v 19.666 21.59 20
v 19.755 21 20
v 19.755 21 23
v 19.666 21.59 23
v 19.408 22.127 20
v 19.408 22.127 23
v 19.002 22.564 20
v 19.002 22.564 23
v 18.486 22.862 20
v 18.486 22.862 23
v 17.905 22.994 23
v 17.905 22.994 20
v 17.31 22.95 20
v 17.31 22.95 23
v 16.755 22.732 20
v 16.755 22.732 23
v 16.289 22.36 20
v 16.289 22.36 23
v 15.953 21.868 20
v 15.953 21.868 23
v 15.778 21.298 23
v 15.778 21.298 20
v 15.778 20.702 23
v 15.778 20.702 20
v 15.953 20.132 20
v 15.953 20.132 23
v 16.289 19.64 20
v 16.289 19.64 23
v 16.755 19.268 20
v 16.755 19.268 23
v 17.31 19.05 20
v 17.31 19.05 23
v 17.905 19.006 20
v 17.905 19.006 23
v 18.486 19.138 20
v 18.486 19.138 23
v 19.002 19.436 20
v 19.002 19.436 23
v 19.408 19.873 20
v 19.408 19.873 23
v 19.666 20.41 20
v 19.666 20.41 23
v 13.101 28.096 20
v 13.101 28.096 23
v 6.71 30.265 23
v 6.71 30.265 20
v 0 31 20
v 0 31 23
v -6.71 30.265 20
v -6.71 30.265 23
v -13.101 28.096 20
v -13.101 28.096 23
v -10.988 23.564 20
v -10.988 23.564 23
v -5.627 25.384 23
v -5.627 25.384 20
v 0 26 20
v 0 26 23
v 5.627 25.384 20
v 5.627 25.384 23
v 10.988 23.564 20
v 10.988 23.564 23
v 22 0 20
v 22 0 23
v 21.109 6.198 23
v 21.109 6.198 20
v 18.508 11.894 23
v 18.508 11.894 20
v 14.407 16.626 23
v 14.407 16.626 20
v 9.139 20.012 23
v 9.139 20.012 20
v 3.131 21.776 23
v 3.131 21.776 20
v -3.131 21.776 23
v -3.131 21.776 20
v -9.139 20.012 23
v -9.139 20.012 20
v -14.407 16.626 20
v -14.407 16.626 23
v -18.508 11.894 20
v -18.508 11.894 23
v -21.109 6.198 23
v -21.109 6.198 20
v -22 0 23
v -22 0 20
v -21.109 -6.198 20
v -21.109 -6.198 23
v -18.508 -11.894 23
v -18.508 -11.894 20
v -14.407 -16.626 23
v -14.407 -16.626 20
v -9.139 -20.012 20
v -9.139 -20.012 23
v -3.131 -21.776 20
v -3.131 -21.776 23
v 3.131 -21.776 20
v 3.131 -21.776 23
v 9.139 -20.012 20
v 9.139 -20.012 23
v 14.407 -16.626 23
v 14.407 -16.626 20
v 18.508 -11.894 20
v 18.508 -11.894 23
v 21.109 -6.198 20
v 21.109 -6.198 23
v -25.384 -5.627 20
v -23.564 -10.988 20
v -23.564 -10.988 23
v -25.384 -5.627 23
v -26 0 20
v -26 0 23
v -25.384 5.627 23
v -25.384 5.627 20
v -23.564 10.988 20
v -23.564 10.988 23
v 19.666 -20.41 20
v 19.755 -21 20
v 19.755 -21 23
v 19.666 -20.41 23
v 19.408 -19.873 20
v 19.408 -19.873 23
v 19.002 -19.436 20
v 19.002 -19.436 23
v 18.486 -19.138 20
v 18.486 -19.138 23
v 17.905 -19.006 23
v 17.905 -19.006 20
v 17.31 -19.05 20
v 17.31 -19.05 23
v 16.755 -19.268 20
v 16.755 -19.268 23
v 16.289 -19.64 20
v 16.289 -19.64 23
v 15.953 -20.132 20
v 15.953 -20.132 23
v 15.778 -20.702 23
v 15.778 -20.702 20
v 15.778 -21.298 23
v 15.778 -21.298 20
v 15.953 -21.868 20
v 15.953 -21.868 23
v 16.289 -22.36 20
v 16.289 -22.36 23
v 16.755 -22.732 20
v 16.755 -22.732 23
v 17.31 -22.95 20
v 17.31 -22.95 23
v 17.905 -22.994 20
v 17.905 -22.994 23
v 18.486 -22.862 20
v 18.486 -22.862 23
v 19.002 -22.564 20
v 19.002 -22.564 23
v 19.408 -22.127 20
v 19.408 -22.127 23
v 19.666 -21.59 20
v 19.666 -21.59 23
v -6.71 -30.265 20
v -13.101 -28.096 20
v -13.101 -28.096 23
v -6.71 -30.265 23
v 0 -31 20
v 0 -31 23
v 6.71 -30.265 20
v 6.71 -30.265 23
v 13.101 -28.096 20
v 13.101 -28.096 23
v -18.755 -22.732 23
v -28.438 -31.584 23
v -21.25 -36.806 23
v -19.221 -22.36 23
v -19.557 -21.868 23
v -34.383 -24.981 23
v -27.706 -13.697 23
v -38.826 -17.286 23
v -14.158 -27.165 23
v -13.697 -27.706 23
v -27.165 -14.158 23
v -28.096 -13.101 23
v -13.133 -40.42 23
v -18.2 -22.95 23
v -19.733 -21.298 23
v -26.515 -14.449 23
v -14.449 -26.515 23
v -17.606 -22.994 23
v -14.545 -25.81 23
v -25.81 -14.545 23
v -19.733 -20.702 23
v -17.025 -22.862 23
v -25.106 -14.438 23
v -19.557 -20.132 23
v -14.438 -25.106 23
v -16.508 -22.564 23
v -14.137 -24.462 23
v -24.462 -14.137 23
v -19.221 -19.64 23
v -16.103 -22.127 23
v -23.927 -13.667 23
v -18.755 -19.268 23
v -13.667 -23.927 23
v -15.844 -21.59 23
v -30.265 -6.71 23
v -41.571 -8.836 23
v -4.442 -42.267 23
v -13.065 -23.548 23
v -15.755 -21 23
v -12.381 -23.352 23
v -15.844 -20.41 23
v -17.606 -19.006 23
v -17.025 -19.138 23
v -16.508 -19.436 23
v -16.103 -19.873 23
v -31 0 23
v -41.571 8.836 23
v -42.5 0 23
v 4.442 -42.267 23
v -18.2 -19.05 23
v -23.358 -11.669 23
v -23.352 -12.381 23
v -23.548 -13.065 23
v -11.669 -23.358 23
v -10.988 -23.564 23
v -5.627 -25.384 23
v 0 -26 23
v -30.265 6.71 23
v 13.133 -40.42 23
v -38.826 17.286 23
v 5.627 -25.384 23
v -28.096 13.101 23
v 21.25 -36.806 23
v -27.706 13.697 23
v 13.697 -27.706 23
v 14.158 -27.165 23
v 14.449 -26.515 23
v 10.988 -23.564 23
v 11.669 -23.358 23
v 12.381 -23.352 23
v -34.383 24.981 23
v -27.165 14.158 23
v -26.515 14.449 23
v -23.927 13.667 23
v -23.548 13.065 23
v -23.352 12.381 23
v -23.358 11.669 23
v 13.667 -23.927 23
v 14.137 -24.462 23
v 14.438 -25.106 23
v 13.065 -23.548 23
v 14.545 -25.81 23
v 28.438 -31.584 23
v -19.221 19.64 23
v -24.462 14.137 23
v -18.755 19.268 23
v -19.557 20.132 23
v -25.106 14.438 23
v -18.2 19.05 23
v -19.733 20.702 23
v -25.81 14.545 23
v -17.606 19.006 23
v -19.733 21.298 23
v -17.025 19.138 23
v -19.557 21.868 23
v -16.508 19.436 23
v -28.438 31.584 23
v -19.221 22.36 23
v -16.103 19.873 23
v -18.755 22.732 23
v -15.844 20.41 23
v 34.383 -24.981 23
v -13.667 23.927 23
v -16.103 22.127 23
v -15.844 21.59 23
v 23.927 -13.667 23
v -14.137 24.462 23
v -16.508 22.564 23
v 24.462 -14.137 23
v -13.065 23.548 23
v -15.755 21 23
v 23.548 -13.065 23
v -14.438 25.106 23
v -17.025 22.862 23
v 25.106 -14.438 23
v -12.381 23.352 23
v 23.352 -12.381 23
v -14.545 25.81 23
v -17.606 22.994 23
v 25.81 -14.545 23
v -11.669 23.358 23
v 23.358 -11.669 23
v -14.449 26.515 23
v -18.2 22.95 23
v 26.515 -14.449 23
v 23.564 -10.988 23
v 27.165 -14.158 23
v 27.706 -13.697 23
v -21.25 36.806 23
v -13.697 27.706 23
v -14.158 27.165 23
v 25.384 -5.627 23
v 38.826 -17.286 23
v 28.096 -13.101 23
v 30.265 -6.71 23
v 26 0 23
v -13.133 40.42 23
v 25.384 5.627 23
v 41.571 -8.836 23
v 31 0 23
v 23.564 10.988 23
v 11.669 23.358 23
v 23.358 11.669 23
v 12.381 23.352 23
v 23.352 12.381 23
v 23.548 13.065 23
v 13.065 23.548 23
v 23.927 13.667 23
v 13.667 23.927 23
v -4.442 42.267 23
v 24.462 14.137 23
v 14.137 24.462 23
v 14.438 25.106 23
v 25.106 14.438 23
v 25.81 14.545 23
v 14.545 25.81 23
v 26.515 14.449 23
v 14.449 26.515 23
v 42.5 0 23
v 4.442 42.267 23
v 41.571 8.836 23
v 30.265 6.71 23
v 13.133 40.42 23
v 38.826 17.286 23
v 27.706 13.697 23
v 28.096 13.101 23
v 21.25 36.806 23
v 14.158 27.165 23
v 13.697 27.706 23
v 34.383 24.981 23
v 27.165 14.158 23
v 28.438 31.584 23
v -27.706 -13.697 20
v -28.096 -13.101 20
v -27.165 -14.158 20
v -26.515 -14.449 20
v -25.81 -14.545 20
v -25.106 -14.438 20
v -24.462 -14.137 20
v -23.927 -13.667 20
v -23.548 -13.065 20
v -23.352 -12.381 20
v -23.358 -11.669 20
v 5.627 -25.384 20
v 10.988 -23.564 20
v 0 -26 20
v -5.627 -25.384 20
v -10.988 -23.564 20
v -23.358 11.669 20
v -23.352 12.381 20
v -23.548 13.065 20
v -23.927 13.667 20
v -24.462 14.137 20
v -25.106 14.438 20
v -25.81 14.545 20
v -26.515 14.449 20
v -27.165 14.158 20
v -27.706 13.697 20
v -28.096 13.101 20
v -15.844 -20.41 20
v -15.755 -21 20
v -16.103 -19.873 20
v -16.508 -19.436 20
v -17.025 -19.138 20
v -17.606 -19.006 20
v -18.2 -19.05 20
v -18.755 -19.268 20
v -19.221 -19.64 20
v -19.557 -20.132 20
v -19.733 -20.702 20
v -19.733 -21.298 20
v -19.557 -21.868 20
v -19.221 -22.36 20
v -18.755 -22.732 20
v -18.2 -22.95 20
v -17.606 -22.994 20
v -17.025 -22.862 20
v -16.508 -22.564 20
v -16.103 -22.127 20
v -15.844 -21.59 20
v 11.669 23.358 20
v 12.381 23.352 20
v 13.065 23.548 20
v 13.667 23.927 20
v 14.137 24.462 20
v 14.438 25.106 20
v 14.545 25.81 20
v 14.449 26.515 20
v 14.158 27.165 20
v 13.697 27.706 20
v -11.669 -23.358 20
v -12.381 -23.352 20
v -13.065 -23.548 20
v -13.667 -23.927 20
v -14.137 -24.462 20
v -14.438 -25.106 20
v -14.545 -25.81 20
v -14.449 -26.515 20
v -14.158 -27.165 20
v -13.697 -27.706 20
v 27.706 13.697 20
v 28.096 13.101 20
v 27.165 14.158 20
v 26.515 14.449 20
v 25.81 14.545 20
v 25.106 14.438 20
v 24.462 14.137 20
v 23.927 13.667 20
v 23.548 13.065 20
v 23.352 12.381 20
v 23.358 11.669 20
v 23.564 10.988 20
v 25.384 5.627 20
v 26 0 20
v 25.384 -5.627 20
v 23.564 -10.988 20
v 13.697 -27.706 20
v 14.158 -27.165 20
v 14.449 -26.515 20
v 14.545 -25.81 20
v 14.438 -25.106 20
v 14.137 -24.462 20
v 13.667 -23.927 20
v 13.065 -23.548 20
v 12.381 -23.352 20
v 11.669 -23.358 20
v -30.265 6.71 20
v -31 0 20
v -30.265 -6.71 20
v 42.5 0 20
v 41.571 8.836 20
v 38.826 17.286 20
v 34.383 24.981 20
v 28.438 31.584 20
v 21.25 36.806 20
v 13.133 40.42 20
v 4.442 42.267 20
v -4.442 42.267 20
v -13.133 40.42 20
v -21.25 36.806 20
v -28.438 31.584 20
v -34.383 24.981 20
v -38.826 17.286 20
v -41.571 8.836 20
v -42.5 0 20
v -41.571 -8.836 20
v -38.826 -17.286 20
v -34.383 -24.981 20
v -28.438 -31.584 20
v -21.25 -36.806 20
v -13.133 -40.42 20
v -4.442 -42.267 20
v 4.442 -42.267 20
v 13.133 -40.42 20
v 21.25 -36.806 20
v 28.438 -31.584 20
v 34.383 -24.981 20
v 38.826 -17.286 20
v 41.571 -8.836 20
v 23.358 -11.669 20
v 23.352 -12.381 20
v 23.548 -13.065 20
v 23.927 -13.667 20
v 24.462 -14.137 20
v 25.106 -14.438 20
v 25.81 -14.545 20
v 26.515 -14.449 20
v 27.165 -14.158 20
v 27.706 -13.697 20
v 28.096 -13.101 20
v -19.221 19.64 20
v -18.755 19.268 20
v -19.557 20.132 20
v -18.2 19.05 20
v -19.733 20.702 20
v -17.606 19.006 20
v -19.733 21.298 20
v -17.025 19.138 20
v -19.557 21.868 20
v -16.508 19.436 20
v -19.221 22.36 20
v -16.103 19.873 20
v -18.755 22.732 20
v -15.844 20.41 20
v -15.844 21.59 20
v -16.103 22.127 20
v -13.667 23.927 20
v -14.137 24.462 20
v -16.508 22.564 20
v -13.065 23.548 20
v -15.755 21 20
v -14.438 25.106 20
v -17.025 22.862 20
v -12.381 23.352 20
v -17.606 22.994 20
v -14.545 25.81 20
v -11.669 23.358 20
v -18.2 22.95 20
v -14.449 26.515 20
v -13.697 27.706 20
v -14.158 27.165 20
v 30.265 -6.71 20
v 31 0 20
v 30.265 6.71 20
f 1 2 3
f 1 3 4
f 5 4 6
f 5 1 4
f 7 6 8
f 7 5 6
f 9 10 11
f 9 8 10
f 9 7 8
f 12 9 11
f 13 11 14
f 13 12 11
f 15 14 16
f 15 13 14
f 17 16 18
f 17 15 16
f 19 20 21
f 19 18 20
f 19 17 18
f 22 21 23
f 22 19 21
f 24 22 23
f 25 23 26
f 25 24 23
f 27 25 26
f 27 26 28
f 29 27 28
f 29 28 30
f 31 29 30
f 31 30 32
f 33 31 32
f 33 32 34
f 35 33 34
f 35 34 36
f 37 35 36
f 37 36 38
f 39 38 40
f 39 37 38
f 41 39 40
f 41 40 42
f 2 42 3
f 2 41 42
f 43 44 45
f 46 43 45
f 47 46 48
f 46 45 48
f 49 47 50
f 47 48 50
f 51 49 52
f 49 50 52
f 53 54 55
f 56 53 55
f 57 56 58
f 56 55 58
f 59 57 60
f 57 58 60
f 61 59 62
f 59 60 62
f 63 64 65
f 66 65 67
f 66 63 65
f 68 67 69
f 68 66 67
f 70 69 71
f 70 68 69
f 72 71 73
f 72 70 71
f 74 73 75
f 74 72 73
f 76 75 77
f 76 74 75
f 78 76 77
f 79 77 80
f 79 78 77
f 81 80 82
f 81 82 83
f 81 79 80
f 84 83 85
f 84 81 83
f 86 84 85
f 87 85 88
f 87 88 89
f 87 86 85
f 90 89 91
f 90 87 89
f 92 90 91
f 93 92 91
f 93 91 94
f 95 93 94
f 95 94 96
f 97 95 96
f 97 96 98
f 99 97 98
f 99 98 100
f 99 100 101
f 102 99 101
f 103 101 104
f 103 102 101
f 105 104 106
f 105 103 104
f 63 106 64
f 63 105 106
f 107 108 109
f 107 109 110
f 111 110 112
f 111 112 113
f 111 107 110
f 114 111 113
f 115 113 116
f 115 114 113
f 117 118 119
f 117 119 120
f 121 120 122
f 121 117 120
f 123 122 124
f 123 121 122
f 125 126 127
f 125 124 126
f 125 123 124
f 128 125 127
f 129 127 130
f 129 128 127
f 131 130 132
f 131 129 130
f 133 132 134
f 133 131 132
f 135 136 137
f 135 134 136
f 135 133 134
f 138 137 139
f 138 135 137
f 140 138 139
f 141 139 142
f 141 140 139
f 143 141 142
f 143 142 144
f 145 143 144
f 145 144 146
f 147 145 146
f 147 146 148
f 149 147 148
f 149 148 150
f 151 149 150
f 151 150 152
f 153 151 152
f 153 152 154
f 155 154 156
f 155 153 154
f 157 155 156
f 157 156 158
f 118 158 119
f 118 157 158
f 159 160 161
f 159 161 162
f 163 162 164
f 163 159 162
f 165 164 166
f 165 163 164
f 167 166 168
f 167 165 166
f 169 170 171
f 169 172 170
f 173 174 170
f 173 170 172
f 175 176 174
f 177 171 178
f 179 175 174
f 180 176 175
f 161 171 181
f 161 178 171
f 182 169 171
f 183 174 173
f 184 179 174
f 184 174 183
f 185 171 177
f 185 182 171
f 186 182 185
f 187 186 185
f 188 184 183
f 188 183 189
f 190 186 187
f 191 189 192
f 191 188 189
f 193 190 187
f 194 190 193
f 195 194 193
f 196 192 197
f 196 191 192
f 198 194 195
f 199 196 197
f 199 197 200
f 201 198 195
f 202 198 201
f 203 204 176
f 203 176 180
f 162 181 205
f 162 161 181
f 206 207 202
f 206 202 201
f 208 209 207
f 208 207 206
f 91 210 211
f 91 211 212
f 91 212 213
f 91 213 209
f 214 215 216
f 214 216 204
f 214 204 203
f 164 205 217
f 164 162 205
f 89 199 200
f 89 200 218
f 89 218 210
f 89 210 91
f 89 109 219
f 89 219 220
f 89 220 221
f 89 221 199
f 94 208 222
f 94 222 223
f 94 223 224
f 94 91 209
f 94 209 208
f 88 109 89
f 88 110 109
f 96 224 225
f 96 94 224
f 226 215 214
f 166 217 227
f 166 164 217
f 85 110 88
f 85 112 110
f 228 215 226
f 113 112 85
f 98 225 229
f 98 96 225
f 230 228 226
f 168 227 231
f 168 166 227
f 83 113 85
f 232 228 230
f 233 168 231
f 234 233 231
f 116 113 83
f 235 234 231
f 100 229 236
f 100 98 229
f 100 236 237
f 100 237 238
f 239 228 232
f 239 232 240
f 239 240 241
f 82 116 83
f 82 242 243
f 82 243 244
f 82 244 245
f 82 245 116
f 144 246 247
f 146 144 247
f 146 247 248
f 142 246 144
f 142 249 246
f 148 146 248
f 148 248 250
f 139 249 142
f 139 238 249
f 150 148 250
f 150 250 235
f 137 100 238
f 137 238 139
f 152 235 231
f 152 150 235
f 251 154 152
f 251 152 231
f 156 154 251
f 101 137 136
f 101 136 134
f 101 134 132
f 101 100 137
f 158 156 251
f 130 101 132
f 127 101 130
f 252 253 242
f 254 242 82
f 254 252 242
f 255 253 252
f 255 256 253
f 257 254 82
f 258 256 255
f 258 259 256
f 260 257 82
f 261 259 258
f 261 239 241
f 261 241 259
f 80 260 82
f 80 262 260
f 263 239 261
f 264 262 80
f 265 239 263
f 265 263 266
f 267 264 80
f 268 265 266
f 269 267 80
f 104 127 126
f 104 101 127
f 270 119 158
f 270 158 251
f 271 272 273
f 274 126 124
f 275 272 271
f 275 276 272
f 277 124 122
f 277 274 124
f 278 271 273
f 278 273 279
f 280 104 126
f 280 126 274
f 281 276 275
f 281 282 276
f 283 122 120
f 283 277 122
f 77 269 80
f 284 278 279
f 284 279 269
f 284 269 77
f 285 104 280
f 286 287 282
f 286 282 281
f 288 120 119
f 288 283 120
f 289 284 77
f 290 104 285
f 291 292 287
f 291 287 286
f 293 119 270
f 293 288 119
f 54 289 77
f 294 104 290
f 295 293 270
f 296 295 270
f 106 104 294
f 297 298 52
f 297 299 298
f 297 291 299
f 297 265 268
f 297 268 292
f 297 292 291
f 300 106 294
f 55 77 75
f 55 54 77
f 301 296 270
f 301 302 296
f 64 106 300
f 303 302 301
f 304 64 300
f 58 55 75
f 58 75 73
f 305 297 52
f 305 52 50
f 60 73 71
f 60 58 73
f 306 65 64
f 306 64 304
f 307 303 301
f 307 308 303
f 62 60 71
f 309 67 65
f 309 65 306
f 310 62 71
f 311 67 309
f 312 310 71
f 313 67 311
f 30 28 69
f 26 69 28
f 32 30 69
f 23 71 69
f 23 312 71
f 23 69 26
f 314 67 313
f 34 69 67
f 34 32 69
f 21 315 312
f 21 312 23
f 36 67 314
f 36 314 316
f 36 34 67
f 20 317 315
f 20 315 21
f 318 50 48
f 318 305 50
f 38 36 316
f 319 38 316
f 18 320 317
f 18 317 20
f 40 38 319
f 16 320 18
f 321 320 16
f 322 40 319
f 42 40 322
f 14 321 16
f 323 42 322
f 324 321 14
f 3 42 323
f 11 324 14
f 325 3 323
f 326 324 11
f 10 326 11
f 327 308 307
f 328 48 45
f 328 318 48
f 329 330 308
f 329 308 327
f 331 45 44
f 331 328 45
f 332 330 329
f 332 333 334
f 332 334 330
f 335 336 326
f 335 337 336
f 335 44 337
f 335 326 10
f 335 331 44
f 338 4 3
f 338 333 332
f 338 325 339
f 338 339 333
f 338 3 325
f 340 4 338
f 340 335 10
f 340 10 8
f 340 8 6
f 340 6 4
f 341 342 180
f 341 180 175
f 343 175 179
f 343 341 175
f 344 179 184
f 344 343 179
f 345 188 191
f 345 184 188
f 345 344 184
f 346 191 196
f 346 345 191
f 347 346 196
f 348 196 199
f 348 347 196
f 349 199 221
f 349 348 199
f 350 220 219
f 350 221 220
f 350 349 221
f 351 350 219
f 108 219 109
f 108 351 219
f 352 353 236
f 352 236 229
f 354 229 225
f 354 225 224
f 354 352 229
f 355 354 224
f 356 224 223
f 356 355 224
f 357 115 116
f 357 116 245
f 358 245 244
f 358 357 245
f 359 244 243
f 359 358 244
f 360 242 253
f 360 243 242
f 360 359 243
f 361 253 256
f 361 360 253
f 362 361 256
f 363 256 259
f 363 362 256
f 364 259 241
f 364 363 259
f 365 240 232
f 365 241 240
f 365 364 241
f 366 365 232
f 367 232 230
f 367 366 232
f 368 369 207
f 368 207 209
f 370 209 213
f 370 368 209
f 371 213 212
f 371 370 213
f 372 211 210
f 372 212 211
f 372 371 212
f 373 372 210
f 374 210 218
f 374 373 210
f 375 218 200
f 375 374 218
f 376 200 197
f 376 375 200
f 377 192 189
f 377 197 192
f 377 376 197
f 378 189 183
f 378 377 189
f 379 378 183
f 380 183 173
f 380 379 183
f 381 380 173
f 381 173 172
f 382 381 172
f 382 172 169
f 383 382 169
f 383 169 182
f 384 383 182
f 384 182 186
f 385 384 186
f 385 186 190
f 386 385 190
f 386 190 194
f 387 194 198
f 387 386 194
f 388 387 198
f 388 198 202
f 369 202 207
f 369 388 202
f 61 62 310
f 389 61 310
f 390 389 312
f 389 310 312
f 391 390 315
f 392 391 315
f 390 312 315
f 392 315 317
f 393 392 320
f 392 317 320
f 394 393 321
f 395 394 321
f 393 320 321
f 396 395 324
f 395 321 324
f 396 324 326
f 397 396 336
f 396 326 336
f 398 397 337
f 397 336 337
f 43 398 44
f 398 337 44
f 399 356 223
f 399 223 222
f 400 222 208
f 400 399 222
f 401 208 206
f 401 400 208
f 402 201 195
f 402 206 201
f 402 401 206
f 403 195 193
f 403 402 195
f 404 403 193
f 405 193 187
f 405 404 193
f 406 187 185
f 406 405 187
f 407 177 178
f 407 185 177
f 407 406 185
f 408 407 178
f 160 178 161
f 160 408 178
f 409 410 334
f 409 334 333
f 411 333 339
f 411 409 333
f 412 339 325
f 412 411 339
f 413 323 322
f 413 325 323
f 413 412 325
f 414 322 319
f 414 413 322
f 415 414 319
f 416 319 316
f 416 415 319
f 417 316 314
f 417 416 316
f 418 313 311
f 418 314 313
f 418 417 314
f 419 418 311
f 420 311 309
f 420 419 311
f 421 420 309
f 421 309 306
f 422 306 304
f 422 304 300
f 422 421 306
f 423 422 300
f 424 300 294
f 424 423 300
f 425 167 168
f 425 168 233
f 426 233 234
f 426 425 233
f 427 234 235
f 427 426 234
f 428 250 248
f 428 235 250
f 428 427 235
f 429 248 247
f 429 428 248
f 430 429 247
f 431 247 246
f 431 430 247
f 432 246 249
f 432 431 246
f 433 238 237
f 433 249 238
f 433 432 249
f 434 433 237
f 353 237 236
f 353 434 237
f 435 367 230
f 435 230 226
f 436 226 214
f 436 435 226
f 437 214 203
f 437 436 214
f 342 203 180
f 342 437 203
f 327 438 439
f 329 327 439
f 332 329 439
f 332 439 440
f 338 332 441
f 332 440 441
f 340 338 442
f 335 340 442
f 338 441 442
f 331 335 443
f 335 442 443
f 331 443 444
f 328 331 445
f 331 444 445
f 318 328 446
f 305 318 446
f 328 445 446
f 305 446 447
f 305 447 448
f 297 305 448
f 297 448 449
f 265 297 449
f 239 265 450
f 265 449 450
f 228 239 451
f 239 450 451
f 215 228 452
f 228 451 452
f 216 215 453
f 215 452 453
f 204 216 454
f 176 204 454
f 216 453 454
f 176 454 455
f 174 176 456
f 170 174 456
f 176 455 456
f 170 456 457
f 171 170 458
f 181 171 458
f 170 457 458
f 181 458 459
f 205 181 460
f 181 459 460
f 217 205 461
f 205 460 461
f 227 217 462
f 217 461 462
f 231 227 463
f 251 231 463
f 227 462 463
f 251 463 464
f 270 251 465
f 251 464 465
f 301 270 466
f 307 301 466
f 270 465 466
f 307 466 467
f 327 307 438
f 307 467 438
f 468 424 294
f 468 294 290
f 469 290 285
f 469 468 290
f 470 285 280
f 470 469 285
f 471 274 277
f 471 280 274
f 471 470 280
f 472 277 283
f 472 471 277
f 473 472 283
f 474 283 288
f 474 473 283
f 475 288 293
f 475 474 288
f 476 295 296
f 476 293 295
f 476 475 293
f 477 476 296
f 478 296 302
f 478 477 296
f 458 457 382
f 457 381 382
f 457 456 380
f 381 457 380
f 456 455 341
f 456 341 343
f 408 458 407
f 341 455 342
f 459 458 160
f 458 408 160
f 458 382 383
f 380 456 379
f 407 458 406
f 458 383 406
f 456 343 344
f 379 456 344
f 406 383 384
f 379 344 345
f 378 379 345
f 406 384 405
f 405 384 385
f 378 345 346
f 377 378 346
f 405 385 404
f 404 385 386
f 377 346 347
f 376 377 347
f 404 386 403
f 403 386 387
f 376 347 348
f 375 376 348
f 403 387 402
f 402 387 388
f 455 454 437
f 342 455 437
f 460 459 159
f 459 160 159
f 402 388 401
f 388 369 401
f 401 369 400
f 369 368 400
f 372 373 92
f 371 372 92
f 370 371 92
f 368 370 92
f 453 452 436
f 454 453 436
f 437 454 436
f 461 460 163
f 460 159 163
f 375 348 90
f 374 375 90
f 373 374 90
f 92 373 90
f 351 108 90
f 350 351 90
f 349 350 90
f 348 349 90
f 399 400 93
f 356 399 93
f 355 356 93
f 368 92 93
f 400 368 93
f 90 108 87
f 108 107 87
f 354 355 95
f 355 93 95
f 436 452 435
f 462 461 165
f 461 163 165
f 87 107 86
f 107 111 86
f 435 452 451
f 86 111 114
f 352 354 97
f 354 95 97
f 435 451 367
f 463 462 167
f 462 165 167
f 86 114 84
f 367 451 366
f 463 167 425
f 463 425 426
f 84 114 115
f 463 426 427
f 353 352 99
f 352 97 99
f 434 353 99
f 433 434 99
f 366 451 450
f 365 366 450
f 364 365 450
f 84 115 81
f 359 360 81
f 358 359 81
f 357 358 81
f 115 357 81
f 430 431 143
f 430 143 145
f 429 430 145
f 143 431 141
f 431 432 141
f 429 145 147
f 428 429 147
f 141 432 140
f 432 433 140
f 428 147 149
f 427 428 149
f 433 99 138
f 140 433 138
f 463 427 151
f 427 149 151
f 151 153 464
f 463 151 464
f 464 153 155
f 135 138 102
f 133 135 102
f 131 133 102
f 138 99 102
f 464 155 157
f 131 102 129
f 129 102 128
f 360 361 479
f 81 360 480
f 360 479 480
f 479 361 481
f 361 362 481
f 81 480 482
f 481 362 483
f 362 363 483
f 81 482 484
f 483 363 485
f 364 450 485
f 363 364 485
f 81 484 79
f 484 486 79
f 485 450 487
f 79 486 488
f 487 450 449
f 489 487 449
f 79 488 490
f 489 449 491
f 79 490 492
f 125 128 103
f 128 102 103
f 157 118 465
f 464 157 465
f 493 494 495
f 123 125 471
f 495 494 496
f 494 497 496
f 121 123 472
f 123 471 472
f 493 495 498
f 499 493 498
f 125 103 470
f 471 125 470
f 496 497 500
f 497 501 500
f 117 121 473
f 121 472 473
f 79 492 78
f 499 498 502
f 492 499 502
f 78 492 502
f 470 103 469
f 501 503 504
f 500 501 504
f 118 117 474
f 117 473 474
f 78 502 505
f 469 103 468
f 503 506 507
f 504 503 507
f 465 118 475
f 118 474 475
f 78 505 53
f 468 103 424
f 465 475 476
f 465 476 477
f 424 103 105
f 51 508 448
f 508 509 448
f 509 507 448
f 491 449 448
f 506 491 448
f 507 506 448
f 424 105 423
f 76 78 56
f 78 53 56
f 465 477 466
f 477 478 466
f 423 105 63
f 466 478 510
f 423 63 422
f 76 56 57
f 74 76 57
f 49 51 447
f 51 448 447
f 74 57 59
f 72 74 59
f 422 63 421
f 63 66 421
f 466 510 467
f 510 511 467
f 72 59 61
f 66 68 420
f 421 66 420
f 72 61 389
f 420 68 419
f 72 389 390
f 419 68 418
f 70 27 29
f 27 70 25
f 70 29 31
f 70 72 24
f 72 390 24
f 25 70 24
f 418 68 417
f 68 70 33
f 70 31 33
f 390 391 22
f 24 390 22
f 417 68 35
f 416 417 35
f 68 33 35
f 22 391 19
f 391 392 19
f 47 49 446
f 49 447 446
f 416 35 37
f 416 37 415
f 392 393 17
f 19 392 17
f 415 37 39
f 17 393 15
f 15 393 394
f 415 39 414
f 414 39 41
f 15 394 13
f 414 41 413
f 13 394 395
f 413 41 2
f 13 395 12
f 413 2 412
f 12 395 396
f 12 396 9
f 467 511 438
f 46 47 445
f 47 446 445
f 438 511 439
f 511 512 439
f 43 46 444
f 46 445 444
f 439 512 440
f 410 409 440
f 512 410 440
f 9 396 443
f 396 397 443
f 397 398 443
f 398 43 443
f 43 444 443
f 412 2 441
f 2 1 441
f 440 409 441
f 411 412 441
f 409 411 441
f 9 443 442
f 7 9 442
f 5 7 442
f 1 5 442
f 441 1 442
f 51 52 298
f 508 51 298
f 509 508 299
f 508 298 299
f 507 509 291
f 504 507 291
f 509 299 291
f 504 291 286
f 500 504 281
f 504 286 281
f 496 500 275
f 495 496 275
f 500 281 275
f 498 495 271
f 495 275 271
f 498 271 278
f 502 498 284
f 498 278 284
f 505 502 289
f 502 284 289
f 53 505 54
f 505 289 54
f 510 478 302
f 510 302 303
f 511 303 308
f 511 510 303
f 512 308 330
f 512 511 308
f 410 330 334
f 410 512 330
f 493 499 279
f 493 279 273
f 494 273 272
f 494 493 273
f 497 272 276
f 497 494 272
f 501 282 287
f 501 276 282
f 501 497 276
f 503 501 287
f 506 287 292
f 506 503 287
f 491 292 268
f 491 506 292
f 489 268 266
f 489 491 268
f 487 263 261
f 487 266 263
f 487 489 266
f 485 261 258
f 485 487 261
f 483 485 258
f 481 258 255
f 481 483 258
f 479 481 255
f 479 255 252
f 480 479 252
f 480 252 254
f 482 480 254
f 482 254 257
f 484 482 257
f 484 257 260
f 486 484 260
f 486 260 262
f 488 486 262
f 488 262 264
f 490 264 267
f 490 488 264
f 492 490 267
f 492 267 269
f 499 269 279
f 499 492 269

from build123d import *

# Parameters (mm, degrees)
SKETCH_1_R          = 24
SKETCH_1_R_2        = 22
EXTRUDE_1_DEPTH     = 20
SKETCH_2_R          = 42.5
SKETCH_2_R_2        = 22
EXTRUDE_2_DEPTH     = 3
CUT_EXTRUDE_3_DEPTH = 5
SKETCH_12_R         = 24
CUT_EXTRUDE_4_DEPTH = 20
SKETCH_13_R         = 2
CUT_EXTRUDE_7_DEPTH = 30


with BuildPart() as part:
    # 草图1 → 凸台-拉伸1 (new body)
    with BuildSketch(Plane.XY):
        Circle(SKETCH_1_R)
        Circle(SKETCH_1_R_2, mode=Mode.SUBTRACT)
    extrude(amount=EXTRUDE_1_DEPTH)

    # 草图2 → 凸台-拉伸2 (add)
    with BuildSketch(Plane.XY.offset(20)):
        Circle(SKETCH_2_R)
        Circle(SKETCH_2_R_2, mode=Mode.SUBTRACT)
    extrude(amount=EXTRUDE_2_DEPTH)

    # 草图10 → 切除-拉伸3 (cut, symmetric)
    with BuildSketch(Plane.XY.offset(23)):
        with BuildLine():
            ThreePointArc((28.095541398, -13.101166114), (31, 0), (28.095541398, 13.101166114))
            ThreePointArc((28.095541398, 13.101166114), (24.773226276, 14.310389927), (23.564002463, 10.988074805))
            ThreePointArc((23.564002463, 10.988074805), (26, 0), (23.564002463, -10.988074805))
            ThreePointArc((23.564002463, -10.988074805), (24.773226276, -14.310389927), (28.095541398, -13.101166114))
        make_face()
        with BuildLine():
            ThreePointArc((-13.101166114, -28.095541398), (0, -31), (13.101166114, -28.095541398))
            ThreePointArc((13.101166114, -28.095541398), (14.310389927, -24.773226276), (10.988074805, -23.564002463))
            ThreePointArc((10.988074805, -23.564002463), (0, -26), (-10.988074805, -23.564002463))
            ThreePointArc((-10.988074805, -23.564002463), (-14.310389927, -24.773226276), (-13.101166114, -28.095541398))
        make_face()
        with BuildLine():
            ThreePointArc((-28.095541398, 13.101166114), (-31, 0), (-28.095541398, -13.101166114))
            ThreePointArc((-28.095541398, -13.101166114), (-24.773226276, -14.310389927), (-23.564002463, -10.988074805))
            ThreePointArc((-23.564002463, -10.988074805), (-26, 0), (-23.564002463, 10.988074805))
            ThreePointArc((-23.564002463, 10.988074805), (-24.773226276, 14.310389927), (-28.095541398, 13.101166114))
        make_face()
        with BuildLine():
            ThreePointArc((13.101166114, 28.095541398), (0, 31), (-13.101166114, 28.095541398))
            ThreePointArc((-13.101166114, 28.095541398), (-14.310389927, 24.773226276), (-10.988074805, 23.564002463))
            ThreePointArc((-10.988074805, 23.564002463), (0, 26), (10.988074805, 23.564002463))
            ThreePointArc((10.988074805, 23.564002463), (14.310389927, 24.773226276), (13.101166114, 28.095541398))
        make_face()
    extrude(amount=CUT_EXTRUDE_3_DEPTH, both=True, mode=Mode.SUBTRACT)

    # 草图12 → 切除-拉伸4 (cut)
    with BuildSketch(Plane(origin=(0, 0, 0), x_dir=(-1, 0, 0), z_dir=(0, 0, -1))):
        Circle(SKETCH_12_R)
    extrude(amount=-CUT_EXTRUDE_4_DEPTH, mode=Mode.SUBTRACT)

    # 草图13 → 切除-拉伸7 (cut)
    with BuildSketch(Plane.XY):
        with Locations((17.755280905, -21)):
            Circle(SKETCH_13_R)
        with Locations((-17.755280905, -21)):
            Circle(SKETCH_13_R)
        with Locations((17.755280905, 21)):
            Circle(SKETCH_13_R)
        with Locations((-17.755280905, 21)):
            Circle(SKETCH_13_R)
    extrude(amount=CUT_EXTRUDE_7_DEPTH, mode=Mode.SUBTRACT)


solid = part.part
